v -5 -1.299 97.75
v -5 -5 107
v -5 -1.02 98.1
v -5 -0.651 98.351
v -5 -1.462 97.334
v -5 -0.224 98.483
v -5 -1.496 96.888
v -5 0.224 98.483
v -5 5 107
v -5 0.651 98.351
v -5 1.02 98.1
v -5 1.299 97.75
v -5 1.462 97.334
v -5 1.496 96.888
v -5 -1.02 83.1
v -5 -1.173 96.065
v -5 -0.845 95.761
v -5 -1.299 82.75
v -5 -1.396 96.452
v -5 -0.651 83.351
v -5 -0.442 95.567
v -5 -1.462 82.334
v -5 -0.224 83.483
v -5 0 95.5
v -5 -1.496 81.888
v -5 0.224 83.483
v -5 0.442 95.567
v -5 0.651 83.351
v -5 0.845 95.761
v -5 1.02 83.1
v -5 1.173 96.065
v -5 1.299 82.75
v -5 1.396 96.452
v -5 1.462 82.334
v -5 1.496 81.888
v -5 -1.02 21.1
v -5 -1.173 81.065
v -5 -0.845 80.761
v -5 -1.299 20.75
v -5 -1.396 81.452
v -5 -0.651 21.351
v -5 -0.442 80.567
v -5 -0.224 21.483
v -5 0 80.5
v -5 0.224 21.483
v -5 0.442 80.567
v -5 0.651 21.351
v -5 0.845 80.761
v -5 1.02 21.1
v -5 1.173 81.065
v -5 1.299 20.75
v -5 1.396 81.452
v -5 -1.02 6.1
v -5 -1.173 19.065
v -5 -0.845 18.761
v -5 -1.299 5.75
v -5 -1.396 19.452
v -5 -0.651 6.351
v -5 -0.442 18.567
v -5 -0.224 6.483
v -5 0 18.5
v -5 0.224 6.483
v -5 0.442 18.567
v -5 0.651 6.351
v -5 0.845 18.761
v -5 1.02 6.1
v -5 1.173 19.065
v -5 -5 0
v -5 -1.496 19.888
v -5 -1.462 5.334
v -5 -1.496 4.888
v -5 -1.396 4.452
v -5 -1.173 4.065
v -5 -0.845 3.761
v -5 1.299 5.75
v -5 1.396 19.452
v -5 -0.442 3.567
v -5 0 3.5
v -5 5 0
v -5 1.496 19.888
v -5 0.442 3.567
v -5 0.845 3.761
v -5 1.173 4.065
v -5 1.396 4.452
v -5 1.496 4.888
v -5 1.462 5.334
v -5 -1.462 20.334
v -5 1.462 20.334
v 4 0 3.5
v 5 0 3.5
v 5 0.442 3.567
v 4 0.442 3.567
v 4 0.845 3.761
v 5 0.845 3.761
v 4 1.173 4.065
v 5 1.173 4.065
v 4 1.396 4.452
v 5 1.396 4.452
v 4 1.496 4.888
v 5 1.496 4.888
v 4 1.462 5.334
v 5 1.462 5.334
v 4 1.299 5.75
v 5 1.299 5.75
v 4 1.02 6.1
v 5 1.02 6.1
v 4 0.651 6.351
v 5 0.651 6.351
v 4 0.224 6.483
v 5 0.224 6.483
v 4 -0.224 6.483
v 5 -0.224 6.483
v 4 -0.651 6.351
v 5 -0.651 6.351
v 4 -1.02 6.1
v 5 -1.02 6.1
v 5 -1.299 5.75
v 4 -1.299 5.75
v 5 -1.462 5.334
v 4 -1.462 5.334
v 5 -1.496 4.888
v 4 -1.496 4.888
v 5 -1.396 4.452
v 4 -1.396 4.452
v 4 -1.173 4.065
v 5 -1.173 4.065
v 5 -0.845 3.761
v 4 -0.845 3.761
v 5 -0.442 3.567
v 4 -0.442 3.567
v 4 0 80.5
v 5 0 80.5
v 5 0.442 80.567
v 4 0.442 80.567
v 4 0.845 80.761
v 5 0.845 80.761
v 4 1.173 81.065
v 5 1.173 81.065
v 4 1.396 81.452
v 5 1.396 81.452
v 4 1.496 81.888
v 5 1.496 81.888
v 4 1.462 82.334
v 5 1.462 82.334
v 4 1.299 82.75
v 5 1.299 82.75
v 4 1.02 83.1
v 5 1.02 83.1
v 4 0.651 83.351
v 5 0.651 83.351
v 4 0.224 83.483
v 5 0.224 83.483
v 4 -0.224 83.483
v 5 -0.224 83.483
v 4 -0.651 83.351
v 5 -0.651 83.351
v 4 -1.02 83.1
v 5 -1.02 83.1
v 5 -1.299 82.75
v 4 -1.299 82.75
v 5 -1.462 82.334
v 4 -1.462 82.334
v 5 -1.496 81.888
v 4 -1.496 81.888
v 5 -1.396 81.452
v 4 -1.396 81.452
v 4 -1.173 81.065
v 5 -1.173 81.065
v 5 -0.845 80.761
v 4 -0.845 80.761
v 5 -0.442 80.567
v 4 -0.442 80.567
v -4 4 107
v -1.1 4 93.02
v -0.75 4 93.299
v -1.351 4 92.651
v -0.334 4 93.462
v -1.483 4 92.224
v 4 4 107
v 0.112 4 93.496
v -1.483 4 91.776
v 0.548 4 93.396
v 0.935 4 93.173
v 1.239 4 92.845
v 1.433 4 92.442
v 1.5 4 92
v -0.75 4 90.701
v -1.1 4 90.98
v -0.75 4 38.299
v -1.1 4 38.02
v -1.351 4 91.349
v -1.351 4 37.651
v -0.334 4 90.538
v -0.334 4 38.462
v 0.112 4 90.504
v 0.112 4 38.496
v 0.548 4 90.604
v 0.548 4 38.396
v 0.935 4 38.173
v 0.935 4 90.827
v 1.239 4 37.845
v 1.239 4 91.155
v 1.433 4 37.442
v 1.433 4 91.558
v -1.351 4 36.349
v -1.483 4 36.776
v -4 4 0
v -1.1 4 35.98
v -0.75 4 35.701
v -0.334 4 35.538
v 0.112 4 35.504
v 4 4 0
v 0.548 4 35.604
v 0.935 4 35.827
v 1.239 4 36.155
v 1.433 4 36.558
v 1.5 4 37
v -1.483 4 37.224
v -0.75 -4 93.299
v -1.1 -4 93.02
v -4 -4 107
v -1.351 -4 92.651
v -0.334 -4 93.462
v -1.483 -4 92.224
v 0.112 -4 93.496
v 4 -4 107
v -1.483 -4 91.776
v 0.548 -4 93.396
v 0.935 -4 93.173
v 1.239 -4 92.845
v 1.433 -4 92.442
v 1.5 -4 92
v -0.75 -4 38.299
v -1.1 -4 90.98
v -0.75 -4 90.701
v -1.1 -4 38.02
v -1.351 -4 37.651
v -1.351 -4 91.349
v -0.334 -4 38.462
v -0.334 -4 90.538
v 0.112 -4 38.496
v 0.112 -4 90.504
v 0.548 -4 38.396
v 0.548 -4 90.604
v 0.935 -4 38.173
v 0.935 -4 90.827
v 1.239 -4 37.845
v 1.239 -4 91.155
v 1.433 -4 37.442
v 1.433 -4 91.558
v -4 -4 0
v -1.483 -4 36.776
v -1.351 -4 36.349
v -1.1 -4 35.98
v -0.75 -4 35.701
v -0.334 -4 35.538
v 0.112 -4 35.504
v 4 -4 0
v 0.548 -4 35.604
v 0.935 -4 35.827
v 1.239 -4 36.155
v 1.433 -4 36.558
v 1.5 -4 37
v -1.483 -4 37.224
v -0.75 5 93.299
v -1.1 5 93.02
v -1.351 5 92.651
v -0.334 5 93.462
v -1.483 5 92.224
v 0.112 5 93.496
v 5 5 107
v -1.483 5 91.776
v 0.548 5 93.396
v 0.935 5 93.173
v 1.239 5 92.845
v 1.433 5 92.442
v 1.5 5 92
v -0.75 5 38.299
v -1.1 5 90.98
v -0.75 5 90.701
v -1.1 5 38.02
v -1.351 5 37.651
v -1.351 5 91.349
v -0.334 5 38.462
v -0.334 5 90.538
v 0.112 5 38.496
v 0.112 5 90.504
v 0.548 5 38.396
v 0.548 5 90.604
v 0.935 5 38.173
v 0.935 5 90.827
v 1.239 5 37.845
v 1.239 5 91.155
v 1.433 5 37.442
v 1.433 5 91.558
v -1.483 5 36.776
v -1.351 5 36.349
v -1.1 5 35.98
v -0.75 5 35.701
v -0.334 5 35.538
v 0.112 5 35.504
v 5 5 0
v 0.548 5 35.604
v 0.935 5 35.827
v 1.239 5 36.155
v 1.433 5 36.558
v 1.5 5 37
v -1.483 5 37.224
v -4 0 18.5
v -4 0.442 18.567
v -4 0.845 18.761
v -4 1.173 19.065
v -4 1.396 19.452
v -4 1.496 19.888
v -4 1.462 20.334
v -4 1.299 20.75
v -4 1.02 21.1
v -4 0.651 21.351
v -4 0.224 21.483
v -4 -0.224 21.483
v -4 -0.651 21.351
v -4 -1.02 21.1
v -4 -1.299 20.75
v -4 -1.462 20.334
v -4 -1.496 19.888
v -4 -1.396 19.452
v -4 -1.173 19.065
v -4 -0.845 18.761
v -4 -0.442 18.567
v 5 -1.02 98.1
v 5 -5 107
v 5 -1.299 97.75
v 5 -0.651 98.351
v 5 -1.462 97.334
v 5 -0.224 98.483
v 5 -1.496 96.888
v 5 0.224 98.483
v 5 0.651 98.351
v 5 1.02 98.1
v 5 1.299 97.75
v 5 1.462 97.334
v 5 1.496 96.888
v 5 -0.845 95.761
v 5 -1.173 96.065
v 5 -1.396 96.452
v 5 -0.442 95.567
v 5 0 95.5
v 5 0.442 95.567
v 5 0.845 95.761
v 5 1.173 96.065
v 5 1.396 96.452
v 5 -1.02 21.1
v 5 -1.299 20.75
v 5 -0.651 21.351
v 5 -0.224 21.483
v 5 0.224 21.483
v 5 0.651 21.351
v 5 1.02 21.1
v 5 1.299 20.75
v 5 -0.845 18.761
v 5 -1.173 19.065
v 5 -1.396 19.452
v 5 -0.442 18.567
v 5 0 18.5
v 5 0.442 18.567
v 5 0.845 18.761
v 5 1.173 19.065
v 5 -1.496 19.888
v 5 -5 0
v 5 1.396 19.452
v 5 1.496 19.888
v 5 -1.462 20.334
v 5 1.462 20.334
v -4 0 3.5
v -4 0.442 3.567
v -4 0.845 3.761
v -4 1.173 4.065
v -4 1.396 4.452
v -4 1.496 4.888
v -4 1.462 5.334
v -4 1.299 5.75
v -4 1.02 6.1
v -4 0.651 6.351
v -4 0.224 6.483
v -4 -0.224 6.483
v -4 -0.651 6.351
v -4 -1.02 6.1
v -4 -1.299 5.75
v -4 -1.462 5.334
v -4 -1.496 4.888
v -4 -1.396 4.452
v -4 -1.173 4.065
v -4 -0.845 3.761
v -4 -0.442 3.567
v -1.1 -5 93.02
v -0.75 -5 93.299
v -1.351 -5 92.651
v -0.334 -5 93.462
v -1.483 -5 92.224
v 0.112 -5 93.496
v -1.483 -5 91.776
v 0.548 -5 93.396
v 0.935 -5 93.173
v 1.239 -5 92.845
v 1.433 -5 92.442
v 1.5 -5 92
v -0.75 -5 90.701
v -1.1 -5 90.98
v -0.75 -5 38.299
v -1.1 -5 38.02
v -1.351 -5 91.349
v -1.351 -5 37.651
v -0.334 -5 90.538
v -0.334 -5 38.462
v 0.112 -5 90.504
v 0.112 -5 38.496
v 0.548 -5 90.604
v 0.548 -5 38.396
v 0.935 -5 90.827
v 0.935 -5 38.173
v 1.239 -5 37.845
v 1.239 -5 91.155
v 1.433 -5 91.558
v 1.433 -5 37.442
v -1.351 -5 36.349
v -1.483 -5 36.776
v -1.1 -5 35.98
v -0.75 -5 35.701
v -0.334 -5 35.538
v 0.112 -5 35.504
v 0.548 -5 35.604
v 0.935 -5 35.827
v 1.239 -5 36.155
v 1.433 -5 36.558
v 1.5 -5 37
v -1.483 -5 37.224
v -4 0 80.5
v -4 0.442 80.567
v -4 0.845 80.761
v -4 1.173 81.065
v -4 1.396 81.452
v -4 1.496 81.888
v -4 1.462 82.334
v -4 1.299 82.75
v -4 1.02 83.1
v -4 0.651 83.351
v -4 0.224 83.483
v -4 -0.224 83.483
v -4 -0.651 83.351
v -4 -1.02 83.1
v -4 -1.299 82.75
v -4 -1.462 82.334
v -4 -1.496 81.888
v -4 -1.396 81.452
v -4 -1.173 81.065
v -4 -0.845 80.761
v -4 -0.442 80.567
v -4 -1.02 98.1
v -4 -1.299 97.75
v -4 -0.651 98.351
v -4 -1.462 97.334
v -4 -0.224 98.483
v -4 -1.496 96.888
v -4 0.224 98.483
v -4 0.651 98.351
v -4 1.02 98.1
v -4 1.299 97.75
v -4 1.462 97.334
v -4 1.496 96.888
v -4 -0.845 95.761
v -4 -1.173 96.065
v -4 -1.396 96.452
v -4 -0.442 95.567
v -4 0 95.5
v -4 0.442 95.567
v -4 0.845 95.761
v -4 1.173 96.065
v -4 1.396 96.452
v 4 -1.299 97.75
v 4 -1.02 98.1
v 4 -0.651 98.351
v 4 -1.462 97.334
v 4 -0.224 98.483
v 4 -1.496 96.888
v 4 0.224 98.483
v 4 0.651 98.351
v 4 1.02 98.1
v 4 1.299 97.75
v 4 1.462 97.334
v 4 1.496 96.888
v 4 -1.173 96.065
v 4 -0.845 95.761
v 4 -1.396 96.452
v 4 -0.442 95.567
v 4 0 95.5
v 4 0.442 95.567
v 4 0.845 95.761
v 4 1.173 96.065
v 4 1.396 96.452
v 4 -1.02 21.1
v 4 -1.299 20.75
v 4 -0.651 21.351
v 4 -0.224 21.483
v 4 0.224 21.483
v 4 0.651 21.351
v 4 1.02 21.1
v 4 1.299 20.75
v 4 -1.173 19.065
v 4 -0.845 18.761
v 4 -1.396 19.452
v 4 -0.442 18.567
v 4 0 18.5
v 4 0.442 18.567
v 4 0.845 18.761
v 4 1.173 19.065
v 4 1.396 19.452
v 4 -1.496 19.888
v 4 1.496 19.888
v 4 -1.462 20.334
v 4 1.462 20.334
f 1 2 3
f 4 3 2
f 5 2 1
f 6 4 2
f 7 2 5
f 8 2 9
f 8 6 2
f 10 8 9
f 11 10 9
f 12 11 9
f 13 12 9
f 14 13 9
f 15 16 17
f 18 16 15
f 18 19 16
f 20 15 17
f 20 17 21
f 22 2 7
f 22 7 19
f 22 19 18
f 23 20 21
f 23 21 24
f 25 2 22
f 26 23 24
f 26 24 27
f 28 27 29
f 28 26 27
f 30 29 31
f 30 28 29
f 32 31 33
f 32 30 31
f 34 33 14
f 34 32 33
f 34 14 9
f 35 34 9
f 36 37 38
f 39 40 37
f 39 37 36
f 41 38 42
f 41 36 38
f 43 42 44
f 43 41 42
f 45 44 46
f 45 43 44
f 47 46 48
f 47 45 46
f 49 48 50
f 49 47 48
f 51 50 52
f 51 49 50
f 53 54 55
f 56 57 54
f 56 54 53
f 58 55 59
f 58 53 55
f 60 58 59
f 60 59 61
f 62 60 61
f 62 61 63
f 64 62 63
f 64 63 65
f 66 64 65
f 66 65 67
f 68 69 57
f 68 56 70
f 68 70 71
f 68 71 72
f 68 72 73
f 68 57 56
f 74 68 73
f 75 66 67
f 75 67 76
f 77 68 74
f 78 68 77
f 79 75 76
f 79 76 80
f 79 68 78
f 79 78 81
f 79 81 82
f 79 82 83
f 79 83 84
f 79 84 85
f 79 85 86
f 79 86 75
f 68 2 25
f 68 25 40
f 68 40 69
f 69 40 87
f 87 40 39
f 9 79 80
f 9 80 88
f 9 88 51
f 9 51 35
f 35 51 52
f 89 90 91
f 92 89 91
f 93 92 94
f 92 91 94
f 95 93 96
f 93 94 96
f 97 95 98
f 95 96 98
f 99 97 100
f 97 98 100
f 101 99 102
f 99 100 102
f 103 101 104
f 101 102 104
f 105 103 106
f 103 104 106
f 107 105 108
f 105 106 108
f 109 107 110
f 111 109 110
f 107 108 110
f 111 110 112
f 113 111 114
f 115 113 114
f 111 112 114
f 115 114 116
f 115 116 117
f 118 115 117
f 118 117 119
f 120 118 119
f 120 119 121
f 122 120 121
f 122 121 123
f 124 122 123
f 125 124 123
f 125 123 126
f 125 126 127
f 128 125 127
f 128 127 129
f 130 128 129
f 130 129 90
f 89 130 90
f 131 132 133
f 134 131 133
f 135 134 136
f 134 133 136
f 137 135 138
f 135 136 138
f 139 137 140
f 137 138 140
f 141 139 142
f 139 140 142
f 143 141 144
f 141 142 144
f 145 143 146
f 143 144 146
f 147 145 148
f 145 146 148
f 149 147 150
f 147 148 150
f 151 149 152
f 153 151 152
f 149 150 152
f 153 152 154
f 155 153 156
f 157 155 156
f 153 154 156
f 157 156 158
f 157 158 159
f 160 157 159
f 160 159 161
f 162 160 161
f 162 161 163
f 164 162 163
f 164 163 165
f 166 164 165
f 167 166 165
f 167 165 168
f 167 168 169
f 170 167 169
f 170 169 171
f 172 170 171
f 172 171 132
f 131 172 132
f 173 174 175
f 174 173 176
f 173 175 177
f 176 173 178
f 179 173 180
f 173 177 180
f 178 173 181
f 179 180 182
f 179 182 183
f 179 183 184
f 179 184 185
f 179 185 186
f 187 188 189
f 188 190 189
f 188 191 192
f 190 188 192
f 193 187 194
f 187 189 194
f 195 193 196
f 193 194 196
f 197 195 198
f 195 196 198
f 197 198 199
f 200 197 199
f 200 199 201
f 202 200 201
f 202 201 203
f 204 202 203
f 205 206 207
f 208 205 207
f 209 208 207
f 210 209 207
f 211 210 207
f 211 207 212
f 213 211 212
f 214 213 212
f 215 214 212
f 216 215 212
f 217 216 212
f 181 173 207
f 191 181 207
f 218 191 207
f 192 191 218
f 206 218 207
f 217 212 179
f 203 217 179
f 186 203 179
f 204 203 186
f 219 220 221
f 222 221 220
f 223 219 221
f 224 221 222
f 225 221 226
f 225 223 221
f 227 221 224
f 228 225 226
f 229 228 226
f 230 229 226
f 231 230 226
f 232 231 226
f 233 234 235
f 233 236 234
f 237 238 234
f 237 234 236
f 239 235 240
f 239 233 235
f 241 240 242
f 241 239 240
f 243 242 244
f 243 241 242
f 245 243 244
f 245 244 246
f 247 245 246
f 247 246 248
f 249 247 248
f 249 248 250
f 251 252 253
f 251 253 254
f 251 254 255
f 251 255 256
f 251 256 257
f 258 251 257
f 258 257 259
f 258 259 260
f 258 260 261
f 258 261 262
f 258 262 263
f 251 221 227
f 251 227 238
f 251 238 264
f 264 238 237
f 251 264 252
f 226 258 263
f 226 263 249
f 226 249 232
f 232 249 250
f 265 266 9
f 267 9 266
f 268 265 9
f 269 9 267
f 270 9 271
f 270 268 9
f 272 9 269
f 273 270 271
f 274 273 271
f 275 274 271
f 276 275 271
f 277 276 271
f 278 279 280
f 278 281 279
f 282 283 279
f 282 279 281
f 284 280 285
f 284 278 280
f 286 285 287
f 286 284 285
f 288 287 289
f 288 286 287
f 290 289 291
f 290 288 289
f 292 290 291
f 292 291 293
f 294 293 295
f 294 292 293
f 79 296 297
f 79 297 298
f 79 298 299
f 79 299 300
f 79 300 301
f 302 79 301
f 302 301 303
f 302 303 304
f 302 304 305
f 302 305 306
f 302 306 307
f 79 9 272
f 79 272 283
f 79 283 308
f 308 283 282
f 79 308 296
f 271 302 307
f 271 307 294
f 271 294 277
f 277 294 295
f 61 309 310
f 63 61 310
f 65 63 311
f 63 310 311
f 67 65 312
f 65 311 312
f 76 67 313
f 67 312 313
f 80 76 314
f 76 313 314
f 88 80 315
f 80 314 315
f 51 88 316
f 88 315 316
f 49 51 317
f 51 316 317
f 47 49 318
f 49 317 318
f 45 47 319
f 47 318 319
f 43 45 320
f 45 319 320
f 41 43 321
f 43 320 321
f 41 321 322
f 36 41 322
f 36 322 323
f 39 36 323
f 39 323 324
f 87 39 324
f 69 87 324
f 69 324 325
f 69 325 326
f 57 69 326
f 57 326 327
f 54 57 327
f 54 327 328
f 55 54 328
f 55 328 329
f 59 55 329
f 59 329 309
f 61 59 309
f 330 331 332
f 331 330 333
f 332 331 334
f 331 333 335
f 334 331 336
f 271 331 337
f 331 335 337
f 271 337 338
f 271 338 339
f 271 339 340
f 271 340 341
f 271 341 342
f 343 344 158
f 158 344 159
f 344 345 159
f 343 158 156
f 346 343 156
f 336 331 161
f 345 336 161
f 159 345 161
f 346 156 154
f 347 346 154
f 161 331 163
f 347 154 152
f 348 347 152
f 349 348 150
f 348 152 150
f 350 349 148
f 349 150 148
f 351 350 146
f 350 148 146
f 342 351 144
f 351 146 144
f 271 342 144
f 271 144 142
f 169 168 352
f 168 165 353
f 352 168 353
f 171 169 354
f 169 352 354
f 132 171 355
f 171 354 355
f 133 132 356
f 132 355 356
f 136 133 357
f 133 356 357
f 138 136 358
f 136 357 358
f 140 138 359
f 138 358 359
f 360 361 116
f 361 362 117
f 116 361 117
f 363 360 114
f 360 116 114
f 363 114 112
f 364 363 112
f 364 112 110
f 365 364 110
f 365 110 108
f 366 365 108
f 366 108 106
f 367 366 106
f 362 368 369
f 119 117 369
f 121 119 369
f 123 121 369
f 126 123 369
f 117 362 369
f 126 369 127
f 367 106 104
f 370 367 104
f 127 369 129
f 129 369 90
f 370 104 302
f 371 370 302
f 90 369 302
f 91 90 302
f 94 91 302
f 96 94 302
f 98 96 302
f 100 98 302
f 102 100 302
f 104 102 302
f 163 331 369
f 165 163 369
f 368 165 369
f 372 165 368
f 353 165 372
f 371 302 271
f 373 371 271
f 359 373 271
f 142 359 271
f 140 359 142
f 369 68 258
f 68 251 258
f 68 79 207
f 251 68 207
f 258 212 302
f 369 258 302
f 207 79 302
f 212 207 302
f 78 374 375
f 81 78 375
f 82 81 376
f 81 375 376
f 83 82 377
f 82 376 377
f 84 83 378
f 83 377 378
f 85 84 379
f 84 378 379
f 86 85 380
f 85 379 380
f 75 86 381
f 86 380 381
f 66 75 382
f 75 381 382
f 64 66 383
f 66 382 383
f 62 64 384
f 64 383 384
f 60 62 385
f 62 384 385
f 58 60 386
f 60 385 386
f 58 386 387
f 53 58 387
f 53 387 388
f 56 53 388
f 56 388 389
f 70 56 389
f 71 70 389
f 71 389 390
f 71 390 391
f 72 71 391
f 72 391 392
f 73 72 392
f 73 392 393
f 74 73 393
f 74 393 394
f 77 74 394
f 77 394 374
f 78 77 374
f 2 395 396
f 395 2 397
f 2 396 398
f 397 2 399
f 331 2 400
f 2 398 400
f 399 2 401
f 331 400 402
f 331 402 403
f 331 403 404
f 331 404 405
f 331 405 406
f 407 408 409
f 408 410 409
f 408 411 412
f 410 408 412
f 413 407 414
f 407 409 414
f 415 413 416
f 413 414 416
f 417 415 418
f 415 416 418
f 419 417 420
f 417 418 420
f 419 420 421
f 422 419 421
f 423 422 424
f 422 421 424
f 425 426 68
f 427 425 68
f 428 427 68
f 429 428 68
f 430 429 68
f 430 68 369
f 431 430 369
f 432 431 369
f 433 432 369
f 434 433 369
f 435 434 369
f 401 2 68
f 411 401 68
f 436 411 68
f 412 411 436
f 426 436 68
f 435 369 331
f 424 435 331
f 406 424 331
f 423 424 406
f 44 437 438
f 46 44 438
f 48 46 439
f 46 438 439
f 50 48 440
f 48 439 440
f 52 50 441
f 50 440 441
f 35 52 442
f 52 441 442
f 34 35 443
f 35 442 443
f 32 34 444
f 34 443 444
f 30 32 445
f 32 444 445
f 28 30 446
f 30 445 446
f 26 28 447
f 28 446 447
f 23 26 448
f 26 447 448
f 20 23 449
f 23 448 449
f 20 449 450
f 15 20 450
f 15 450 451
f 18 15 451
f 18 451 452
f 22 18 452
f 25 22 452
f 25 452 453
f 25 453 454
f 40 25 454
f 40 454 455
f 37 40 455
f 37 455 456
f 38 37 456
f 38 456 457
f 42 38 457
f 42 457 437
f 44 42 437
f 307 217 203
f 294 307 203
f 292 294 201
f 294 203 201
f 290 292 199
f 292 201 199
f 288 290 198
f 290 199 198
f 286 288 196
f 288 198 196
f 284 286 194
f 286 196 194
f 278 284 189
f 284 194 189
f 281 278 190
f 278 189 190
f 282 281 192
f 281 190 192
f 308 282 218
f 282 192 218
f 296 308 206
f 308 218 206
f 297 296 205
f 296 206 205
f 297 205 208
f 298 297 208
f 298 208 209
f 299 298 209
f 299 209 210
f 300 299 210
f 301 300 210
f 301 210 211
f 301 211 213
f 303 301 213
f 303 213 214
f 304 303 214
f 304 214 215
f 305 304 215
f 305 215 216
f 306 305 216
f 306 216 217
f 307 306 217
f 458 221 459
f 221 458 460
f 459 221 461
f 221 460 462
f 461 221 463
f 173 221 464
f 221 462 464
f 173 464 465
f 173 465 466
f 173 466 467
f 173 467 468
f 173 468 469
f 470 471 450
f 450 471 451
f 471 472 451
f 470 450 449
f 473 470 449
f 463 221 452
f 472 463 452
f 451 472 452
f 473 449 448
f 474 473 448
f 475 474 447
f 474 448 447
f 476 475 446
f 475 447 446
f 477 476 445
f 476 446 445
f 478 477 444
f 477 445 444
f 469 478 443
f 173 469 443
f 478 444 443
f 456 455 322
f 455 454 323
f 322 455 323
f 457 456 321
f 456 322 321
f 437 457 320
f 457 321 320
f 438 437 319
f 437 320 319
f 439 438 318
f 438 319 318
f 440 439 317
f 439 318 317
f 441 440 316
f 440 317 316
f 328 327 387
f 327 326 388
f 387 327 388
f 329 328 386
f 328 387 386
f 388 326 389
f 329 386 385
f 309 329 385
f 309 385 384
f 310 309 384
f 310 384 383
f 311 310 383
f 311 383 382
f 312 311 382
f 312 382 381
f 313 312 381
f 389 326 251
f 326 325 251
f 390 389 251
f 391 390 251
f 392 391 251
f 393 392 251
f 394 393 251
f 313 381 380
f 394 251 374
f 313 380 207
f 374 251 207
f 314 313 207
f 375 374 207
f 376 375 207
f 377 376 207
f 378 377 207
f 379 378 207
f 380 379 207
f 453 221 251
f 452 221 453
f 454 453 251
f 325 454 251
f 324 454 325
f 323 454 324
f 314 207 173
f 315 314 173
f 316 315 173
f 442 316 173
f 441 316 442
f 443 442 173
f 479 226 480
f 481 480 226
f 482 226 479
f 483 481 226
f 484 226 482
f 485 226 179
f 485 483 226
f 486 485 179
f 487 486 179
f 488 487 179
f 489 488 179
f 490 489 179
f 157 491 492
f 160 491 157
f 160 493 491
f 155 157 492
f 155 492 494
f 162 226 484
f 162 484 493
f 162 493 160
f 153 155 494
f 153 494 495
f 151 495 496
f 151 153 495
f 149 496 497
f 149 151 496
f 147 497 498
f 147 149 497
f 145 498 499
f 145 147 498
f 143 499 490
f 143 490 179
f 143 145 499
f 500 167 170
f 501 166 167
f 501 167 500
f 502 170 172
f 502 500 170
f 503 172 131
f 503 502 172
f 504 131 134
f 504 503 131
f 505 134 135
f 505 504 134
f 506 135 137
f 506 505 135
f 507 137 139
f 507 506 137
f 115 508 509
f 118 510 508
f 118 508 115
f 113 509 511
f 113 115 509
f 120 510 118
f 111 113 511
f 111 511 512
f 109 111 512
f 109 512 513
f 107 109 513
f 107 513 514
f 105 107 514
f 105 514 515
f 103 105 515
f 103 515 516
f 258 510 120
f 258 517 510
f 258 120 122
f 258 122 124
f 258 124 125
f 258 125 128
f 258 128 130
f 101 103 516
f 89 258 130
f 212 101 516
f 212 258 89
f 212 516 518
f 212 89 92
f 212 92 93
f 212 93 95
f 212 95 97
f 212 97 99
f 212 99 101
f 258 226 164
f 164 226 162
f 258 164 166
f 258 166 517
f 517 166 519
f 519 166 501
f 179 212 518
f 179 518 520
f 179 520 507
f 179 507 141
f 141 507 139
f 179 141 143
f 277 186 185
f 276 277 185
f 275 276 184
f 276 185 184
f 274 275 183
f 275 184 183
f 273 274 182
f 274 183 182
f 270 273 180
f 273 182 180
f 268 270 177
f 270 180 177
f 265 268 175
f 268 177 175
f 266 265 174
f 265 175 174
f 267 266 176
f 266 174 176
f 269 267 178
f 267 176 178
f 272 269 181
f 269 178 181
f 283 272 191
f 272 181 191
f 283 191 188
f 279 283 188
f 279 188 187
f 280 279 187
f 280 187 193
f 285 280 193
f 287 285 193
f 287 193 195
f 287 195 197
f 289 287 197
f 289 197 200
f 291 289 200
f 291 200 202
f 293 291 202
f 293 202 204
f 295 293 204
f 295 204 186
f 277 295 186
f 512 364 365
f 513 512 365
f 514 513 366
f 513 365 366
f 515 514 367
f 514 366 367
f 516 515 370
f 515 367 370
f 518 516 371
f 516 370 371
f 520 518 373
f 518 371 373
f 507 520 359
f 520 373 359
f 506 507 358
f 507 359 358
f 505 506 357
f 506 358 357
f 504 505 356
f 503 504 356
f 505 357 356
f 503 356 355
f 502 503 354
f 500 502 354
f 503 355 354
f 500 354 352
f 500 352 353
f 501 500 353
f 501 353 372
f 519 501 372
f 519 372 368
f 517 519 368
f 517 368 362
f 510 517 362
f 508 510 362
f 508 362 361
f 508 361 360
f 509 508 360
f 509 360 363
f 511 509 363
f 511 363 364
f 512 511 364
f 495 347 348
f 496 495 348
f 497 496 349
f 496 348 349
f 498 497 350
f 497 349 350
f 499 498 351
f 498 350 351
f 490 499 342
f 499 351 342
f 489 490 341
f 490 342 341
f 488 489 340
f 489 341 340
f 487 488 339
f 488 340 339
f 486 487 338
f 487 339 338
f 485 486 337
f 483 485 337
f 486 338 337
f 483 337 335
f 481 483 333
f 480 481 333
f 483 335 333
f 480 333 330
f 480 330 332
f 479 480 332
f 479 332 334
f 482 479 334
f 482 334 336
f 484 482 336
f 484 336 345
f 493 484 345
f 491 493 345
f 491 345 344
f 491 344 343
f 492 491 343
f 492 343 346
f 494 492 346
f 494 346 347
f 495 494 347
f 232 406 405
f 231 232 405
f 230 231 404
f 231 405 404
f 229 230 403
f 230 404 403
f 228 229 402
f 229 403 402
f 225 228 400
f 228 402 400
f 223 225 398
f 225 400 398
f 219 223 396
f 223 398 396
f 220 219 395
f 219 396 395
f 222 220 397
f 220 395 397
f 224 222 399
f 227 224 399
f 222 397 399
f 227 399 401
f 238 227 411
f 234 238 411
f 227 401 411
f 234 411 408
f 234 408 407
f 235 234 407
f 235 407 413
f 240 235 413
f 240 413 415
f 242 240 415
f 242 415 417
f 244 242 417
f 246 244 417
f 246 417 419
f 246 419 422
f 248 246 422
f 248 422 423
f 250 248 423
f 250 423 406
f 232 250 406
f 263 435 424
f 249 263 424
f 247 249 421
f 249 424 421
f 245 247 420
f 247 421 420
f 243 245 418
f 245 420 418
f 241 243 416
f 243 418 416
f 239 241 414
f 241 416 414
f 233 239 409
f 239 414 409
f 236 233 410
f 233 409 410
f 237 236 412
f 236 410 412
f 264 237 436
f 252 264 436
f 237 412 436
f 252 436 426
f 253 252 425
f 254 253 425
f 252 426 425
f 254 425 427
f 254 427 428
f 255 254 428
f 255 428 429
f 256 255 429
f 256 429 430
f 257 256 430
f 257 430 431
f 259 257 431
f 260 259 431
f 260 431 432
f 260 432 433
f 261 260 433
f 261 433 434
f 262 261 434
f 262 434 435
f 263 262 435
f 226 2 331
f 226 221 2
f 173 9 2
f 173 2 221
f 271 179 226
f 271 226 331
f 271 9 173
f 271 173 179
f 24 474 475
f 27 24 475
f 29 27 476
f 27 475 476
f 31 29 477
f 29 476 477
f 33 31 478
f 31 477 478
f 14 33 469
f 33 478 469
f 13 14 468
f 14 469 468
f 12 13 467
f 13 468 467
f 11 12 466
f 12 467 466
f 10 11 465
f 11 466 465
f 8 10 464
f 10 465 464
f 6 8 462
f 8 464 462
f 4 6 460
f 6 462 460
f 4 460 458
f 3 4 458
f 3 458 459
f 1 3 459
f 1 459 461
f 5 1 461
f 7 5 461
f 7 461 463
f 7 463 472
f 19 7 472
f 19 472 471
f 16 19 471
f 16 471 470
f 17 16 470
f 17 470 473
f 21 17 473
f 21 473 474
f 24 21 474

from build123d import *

# Parameters (mm, degrees)
SKETCH_1_W          = 10
SKETCH_1_H          = 10
SKETCH_1_W_2        = 8
SKETCH_1_H_2        = 8
EXTRUDE_1_DEPTH     = 107
SKETCH_2_R          = 1.5
CUT_EXTRUDE_1_DEPTH = 11
SKETCH_3_R          = 1.5
CUT_EXTRUDE_2_DEPTH = 10


with BuildPart() as part:
    # 草图1 → 拉伸-薄壁1 (new body)
    with BuildSketch(Plane.XY):
        Rectangle(SKETCH_1_W, SKETCH_1_H)
        Rectangle(SKETCH_1_W_2, SKETCH_1_H_2, mode=Mode.SUBTRACT)
    extrude(amount=EXTRUDE_1_DEPTH)

    # 草图2 → 切除-拉伸1 (cut, through all)
    with BuildSketch(Plane(origin=(5, 0, 0), x_dir=(0, 0, -1), z_dir=(1, 0, 0))):
        with Locations((-5, 0)):
            Circle(SKETCH_2_R)
        with Locations((-20, 0)):
            Circle(SKETCH_2_R)
        with Locations((-97, 0)):
            Circle(SKETCH_2_R)
        with Locations((-82, 0)):
            Circle(SKETCH_2_R)
    extrude(amount=-CUT_EXTRUDE_1_DEPTH, mode=Mode.SUBTRACT)

    # 草图3 → 切除-拉伸2 (cut)
    with BuildSketch(Plane.XZ.offset(5)):
        with Locations((0, 92)):
            Circle(SKETCH_3_R)
        with Locations((0, 37)):
            Circle(SKETCH_3_R)
    extrude(amount=-CUT_EXTRUDE_2_DEPTH, mode=Mode.SUBTRACT)


solid = part.part
